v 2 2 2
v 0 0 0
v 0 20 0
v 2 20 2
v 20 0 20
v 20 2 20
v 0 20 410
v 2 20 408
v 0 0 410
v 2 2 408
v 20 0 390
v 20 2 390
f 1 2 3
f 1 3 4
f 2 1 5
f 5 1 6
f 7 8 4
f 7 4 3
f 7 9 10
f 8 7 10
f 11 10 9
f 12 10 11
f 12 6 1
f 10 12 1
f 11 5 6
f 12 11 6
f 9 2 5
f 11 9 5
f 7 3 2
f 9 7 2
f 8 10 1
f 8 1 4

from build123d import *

# Parameters (mm, degrees)
BOSS_EXTRUDE1_DEPTH = 410
CUT_EXTRUDE1_DEPTH  = 21


with BuildPart() as part:
    # Sketch1 → Boss-Extrude1 (new body)
    with BuildSketch(Plane.XY):
        Polygon((0, 20), (0, 0), (20, 0), (20, 2), (2, 2), (2, 20), align=None)
    extrude(amount=BOSS_EXTRUDE1_DEPTH)

    # Sketch2 → Cut-Extrude1 (cut, through all)
    with BuildSketch(Plane(origin=(0, 20, 0), x_dir=(1, 0, 0), z_dir=(0, 1, 0))):
        Polygon((0, 0), (20, -20), (20, 0), align=None)
        Polygon((0, -410), (20, -390), (20, -410), align=None)
    extrude(amount=-CUT_EXTRUDE1_DEPTH, mode=Mode.SUBTRACT)


solid = part.part
